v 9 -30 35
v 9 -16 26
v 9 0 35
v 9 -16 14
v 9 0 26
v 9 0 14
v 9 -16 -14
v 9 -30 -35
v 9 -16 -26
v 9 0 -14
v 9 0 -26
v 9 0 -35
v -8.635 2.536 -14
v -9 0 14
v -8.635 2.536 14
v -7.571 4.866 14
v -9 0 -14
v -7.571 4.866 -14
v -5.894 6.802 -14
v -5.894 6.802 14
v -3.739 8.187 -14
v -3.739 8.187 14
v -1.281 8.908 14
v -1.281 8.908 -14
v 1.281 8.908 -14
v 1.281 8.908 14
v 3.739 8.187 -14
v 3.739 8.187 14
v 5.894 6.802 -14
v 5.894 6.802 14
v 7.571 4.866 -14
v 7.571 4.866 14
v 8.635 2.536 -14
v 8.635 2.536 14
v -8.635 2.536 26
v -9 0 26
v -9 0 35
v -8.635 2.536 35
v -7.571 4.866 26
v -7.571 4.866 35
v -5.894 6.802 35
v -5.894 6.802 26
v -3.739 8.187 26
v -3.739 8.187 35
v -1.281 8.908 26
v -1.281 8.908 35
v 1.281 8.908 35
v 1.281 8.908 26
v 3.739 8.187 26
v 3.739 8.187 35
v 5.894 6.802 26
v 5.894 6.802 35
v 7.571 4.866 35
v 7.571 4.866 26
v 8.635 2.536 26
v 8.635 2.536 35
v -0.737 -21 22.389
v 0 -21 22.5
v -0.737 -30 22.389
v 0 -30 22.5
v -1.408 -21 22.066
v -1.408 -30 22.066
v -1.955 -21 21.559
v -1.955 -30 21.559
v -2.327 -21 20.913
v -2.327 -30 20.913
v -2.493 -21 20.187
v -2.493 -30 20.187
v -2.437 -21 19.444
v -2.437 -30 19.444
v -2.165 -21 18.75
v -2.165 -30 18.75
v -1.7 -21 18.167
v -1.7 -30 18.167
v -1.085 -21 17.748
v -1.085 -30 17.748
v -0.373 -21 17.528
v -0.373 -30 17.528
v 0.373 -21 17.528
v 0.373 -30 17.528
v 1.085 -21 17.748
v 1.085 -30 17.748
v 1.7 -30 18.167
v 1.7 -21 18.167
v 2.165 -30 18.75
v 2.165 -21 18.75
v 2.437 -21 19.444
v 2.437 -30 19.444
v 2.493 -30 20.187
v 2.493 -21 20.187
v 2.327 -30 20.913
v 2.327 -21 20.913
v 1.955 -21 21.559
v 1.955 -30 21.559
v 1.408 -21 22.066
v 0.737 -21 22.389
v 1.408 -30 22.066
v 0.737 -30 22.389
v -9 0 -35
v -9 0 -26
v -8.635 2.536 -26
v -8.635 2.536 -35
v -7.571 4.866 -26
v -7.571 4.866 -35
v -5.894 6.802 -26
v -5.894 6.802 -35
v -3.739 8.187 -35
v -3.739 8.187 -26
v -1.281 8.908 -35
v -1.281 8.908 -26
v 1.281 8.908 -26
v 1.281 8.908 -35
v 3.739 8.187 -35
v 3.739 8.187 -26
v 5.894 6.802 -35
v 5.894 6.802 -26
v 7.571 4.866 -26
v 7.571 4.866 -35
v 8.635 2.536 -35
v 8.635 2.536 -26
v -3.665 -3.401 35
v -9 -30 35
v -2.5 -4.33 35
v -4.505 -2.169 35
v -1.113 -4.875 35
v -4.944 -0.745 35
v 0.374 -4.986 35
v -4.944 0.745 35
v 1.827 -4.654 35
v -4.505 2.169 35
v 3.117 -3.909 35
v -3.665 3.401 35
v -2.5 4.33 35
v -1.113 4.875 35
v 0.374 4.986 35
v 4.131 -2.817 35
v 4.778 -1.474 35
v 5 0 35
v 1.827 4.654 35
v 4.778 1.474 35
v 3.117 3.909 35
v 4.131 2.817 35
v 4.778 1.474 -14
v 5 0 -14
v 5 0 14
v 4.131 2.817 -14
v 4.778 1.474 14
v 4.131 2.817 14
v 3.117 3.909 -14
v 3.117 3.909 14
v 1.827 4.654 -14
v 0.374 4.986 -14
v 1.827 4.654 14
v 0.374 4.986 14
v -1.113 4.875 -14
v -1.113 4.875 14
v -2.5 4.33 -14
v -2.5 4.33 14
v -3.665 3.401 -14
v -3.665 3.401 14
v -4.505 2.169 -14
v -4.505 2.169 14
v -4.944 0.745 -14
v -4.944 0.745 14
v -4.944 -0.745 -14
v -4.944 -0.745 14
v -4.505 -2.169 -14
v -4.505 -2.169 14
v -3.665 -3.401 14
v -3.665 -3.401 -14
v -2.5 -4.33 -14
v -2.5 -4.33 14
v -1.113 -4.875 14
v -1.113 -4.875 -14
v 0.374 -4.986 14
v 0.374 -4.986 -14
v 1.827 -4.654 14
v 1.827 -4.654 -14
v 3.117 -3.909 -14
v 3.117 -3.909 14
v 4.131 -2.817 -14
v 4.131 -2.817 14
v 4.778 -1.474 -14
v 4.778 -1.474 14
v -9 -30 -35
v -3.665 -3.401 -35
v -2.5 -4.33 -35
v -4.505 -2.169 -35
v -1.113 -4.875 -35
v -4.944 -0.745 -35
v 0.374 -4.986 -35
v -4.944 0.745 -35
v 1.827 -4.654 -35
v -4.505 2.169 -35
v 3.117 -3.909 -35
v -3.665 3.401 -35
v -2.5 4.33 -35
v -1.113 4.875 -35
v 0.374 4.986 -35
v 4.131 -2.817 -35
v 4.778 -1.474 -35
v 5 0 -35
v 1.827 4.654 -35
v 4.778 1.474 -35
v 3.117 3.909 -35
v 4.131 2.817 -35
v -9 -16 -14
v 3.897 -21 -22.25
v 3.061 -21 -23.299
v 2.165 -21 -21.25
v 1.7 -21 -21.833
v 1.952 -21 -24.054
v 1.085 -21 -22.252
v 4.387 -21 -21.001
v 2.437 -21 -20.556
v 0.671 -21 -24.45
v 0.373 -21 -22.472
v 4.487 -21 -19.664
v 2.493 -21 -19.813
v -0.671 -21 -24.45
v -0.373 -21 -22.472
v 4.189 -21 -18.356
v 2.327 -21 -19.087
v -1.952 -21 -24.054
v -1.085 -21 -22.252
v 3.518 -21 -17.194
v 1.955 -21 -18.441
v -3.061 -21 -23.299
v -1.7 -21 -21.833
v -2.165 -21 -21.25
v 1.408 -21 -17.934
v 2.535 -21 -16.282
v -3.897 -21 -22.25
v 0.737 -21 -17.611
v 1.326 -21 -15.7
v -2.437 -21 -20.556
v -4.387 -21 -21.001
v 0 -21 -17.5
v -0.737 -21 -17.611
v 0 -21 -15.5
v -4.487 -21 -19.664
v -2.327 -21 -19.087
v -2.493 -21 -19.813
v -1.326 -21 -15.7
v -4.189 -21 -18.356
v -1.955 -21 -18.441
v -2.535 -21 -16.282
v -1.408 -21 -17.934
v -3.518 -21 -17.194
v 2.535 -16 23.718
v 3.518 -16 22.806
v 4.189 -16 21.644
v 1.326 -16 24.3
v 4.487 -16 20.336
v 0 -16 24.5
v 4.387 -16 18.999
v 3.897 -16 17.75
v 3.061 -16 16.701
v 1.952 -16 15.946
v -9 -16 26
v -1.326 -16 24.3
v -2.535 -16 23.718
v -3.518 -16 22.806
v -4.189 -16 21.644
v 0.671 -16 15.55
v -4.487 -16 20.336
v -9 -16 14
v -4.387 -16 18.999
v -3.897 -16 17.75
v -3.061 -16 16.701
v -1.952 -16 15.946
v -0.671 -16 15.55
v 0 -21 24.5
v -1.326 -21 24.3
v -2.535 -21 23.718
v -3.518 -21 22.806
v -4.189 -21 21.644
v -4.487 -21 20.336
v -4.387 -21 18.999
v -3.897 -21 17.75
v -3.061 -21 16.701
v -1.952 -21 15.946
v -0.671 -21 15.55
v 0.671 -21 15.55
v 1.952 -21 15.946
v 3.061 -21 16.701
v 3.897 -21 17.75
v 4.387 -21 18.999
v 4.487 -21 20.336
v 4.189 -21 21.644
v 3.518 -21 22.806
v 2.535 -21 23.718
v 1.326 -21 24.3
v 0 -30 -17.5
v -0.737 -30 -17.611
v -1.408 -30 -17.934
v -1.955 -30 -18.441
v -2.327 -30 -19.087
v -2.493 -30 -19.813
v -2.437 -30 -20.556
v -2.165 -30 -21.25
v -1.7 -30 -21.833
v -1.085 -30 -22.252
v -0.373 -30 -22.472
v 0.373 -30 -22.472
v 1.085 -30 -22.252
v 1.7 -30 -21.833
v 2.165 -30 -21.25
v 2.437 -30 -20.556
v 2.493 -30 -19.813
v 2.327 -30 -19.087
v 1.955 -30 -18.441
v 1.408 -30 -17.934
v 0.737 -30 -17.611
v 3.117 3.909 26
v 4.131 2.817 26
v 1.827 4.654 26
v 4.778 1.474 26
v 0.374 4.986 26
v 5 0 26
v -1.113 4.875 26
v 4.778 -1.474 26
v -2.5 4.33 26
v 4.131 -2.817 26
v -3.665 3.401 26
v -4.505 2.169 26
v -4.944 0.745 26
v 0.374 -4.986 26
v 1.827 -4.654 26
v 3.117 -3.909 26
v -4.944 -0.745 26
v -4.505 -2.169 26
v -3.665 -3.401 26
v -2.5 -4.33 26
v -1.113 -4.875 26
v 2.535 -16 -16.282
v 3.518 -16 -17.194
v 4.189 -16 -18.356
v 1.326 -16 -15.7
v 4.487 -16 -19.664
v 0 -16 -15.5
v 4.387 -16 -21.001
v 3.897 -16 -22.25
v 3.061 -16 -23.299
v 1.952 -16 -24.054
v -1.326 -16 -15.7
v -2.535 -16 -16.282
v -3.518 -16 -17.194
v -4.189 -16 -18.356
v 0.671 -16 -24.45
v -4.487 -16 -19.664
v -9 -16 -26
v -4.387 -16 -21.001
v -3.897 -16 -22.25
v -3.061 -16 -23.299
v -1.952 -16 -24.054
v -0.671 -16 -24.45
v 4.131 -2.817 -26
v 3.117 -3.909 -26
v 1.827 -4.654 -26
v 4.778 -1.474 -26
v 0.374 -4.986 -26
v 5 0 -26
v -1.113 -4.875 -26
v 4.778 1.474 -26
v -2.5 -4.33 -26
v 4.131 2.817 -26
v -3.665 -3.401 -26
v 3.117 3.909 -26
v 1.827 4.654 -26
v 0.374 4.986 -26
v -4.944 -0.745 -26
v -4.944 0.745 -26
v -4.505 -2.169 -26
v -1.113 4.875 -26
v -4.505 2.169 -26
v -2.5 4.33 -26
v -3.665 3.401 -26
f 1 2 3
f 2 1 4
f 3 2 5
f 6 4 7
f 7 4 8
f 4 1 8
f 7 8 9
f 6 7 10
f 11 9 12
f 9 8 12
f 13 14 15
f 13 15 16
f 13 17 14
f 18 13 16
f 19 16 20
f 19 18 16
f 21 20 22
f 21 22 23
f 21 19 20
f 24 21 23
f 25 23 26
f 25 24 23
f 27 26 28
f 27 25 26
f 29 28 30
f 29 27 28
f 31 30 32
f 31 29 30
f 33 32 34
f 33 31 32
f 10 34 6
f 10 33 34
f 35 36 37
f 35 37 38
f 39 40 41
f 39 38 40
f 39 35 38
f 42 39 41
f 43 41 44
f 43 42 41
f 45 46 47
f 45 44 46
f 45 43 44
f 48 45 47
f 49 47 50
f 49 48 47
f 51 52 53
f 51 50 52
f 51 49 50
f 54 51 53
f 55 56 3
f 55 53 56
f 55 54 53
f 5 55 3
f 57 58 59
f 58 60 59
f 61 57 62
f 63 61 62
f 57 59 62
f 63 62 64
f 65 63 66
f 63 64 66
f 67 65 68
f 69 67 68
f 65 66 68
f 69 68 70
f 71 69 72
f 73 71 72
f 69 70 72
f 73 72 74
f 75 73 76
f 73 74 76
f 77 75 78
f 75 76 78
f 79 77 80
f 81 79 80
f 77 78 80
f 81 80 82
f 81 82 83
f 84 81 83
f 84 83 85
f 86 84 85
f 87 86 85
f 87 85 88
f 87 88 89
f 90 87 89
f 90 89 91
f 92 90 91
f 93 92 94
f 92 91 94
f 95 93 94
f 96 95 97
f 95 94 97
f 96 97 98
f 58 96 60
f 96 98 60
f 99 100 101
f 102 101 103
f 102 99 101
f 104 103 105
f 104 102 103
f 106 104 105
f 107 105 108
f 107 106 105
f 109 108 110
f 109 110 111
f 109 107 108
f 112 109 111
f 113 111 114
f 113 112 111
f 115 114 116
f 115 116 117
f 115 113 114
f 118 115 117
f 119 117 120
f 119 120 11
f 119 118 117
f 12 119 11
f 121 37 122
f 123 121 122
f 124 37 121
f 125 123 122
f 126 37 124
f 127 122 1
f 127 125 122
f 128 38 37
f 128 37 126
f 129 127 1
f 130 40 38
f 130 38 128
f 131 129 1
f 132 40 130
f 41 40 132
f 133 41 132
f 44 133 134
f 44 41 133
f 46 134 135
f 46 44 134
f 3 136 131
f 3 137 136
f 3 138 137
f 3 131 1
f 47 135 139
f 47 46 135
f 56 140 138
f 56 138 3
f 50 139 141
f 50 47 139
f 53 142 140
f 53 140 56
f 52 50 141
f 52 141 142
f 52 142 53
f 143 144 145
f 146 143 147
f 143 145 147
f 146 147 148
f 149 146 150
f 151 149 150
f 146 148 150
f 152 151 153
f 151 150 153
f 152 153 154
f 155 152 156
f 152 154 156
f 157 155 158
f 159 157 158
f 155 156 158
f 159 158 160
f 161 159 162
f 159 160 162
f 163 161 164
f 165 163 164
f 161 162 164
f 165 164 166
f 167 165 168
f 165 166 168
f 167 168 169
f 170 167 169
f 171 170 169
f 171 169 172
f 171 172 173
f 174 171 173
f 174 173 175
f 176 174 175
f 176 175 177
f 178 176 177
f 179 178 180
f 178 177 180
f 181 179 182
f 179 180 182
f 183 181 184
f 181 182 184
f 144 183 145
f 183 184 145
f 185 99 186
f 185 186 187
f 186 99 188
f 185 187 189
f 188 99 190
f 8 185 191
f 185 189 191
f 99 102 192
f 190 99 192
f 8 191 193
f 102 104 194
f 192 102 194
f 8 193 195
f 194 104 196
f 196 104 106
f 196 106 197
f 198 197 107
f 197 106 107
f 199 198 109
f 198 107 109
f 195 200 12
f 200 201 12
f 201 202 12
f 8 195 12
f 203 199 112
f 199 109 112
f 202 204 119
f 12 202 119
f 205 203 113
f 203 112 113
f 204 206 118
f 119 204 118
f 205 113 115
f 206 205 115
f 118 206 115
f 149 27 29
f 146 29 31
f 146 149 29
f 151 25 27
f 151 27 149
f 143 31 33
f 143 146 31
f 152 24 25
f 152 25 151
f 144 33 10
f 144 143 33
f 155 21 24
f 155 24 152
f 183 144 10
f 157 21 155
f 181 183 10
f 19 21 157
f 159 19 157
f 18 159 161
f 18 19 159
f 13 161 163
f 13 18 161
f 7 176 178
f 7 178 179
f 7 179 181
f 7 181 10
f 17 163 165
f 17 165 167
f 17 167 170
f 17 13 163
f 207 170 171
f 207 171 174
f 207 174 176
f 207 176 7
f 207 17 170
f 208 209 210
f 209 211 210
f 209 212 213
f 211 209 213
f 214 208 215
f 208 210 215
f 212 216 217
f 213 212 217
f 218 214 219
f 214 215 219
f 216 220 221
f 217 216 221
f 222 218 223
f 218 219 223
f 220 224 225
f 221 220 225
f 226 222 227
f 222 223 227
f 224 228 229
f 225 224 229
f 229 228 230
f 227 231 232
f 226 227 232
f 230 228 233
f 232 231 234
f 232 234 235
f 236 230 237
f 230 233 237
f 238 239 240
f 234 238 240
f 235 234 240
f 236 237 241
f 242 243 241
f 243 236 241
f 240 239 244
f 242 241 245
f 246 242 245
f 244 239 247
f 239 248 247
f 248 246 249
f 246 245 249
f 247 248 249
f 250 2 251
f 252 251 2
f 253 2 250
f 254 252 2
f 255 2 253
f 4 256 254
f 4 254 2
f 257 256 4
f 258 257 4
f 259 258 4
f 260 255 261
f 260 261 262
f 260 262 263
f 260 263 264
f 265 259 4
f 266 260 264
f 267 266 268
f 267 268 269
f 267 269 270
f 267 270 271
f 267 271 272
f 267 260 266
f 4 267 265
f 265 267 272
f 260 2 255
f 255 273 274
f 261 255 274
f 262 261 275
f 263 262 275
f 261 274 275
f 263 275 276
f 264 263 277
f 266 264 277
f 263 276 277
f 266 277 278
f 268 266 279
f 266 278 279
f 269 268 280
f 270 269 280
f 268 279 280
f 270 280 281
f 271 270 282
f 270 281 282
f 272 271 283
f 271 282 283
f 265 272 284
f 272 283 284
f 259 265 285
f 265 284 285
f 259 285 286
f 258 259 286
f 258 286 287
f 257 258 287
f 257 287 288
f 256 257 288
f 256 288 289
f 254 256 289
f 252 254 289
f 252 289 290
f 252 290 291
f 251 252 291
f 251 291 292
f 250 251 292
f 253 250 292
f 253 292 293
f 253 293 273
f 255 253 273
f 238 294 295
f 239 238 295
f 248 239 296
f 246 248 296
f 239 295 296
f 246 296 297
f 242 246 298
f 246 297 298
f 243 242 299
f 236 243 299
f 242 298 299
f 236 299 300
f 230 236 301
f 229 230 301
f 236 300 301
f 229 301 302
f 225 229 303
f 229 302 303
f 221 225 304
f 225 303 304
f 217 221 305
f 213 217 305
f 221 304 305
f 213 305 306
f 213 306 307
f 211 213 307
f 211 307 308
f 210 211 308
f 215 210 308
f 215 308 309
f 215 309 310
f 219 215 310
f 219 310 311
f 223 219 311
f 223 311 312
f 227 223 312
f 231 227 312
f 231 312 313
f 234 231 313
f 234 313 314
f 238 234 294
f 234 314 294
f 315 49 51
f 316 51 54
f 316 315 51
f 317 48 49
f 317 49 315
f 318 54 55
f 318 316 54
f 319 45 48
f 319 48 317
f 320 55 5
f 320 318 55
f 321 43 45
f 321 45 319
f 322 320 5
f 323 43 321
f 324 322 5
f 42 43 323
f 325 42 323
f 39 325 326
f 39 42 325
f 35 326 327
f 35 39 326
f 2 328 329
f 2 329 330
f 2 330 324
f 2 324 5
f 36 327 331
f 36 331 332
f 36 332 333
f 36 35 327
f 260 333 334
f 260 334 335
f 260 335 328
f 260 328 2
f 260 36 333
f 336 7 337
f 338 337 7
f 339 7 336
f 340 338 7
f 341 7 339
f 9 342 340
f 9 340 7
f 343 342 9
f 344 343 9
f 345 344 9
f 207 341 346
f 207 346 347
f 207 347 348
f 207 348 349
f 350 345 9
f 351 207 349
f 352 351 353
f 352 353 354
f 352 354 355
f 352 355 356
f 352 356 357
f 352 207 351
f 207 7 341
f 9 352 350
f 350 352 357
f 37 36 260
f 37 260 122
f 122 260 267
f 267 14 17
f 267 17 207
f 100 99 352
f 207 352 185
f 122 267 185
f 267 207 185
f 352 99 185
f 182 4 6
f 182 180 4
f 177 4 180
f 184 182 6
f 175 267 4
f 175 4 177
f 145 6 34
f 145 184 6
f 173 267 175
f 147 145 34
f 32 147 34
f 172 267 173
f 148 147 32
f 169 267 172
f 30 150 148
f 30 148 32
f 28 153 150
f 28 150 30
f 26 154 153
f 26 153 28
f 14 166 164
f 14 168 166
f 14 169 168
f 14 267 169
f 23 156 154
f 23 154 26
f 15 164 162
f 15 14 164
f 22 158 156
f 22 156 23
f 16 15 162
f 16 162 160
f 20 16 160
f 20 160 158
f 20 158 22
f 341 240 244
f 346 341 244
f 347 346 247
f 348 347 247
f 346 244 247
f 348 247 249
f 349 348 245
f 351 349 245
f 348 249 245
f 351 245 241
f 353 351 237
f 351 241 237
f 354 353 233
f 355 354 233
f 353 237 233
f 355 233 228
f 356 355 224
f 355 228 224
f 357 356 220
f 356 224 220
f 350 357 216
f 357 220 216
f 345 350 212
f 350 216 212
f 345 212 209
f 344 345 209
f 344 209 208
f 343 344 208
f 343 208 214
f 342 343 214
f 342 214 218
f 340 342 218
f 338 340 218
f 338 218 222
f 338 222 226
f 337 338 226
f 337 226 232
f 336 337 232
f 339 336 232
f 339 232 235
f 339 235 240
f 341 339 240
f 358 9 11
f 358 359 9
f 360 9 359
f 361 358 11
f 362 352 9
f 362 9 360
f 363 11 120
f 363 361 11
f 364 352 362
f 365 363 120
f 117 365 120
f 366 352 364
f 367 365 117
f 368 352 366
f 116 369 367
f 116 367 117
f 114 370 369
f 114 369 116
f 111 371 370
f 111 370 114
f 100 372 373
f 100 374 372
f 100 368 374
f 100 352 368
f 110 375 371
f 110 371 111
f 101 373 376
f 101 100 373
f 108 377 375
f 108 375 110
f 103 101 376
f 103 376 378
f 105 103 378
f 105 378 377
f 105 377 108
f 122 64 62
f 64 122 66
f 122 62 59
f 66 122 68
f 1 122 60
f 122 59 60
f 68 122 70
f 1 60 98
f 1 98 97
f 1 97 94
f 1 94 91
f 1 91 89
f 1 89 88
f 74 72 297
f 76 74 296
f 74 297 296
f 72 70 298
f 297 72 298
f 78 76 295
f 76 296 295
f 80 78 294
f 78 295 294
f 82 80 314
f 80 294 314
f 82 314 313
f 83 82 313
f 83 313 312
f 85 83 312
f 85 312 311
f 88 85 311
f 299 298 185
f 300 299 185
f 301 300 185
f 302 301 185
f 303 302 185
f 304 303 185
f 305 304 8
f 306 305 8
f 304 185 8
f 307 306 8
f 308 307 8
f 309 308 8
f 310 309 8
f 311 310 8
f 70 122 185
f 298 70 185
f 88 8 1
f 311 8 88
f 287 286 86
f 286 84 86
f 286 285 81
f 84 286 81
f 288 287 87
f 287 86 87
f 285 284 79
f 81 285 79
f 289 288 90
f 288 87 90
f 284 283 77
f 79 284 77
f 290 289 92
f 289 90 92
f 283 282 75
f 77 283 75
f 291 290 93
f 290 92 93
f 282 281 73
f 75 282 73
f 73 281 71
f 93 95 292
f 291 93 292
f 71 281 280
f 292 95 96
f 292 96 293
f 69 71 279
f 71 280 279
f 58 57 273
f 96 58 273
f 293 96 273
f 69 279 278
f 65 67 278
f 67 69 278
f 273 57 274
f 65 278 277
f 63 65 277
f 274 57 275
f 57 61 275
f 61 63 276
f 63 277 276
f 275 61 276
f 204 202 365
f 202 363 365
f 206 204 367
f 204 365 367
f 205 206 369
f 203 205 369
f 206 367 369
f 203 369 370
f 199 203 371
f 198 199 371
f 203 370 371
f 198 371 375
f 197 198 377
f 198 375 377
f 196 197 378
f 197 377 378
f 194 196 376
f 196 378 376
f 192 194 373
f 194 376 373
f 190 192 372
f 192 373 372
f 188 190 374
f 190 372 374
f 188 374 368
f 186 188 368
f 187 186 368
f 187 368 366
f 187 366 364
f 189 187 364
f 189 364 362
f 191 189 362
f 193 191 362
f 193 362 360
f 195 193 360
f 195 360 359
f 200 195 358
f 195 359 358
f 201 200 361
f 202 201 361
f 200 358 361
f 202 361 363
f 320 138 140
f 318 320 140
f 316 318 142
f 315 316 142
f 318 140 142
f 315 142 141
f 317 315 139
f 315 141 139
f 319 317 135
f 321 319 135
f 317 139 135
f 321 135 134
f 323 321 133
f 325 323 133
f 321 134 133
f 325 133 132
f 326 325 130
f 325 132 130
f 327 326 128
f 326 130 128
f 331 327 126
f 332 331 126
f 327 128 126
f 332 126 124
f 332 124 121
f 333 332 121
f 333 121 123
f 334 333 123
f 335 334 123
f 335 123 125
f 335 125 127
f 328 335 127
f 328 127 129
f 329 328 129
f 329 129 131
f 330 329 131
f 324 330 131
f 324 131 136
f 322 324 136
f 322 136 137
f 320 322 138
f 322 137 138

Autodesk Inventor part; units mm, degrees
ref_plane "YZ Plane" through (0, 0, 0) normal (1, 0, 0) x (0, 1, 0)
ref_plane "XZ Plane" through (0, 0, 0) normal (0, 1, 0) x (-1, 0, 0)
ref_plane "XY Plane" through (0, 0, 0) normal (0, 0, 1) x (1, 0, 0)
sketch "Esboço1" plane through (0, 0, 0) normal (0, 0, 1) x (1, 0, 0)
  arc A0 (9, 0) -> (-9, 0) centre (0, 0) ccw
  line L0 (-9, 0) -> (-9, -30)
  line L1 (-9, -30) -> (9, -30)
  line L2 (9, -30) -> (9, 0)
  dimension "d1" = 9
  dimension "d2" = 30
extrude "Extrusão1" add sketch "Esboço1" along normal mid plane 70
sketch "Esboço2" plane through (0, 0, 0) normal (1, 0, 0) x (0, 1, 0)
  line L0 (9, -35) -> (9, 35) projected
  line L1 (9, 26) -> (-16, 26)
  line L2 (-16, 26) -> (-16, 14)
  line L3 (-16, 14) -> (9, 14)
  line L4 (9, 14) -> (9, 26)
  line L5 (9, -14) -> (-16, -14)
  line L6 (-16, -14) -> (-16, -26)
  line L7 (-16, -26) -> (9, -26)
  line L8 (9, -26) -> (9, -14)
  line L9 (-30, -35) -> (-30, 35) projected
  point P0 (0, 0)
  point P1 (-16, -20)
  point P2 (-16, 20)
  dimension "d5" = 12
  dimension "d6" = 14
  dimension "d7" = 14
  dimension "d8" = 14
  dimension "d9" = 12
extrude "Extrusão2" cut sketch "Esboço2" along normal mid plane 20
sketch "Esboço3" plane through (0, 0, 35) normal (0, 0, 1) x (1, 0, 0)
  circle A0 centre (0, 0) radius 5
  dimension "d12" = 10
extrude "Extrusão3" cut sketch "Esboço3" against normal through all
sketch "Esboço4" plane through (-9, -16, 26) normal (0, 1, 0) x (1, 0, 0)
  point P0 (9, 26)
  point P1 (9, 6)
  point P2 (9, 46)
  dimension "d15" = 20
  dimension "d16" = 20
hole "Furo1" at (0, -16, 20) at (0, -16, -20) direction (0, -1, 0) diameter 5 end through all counterbore diameter 9 counterbore depth 5
